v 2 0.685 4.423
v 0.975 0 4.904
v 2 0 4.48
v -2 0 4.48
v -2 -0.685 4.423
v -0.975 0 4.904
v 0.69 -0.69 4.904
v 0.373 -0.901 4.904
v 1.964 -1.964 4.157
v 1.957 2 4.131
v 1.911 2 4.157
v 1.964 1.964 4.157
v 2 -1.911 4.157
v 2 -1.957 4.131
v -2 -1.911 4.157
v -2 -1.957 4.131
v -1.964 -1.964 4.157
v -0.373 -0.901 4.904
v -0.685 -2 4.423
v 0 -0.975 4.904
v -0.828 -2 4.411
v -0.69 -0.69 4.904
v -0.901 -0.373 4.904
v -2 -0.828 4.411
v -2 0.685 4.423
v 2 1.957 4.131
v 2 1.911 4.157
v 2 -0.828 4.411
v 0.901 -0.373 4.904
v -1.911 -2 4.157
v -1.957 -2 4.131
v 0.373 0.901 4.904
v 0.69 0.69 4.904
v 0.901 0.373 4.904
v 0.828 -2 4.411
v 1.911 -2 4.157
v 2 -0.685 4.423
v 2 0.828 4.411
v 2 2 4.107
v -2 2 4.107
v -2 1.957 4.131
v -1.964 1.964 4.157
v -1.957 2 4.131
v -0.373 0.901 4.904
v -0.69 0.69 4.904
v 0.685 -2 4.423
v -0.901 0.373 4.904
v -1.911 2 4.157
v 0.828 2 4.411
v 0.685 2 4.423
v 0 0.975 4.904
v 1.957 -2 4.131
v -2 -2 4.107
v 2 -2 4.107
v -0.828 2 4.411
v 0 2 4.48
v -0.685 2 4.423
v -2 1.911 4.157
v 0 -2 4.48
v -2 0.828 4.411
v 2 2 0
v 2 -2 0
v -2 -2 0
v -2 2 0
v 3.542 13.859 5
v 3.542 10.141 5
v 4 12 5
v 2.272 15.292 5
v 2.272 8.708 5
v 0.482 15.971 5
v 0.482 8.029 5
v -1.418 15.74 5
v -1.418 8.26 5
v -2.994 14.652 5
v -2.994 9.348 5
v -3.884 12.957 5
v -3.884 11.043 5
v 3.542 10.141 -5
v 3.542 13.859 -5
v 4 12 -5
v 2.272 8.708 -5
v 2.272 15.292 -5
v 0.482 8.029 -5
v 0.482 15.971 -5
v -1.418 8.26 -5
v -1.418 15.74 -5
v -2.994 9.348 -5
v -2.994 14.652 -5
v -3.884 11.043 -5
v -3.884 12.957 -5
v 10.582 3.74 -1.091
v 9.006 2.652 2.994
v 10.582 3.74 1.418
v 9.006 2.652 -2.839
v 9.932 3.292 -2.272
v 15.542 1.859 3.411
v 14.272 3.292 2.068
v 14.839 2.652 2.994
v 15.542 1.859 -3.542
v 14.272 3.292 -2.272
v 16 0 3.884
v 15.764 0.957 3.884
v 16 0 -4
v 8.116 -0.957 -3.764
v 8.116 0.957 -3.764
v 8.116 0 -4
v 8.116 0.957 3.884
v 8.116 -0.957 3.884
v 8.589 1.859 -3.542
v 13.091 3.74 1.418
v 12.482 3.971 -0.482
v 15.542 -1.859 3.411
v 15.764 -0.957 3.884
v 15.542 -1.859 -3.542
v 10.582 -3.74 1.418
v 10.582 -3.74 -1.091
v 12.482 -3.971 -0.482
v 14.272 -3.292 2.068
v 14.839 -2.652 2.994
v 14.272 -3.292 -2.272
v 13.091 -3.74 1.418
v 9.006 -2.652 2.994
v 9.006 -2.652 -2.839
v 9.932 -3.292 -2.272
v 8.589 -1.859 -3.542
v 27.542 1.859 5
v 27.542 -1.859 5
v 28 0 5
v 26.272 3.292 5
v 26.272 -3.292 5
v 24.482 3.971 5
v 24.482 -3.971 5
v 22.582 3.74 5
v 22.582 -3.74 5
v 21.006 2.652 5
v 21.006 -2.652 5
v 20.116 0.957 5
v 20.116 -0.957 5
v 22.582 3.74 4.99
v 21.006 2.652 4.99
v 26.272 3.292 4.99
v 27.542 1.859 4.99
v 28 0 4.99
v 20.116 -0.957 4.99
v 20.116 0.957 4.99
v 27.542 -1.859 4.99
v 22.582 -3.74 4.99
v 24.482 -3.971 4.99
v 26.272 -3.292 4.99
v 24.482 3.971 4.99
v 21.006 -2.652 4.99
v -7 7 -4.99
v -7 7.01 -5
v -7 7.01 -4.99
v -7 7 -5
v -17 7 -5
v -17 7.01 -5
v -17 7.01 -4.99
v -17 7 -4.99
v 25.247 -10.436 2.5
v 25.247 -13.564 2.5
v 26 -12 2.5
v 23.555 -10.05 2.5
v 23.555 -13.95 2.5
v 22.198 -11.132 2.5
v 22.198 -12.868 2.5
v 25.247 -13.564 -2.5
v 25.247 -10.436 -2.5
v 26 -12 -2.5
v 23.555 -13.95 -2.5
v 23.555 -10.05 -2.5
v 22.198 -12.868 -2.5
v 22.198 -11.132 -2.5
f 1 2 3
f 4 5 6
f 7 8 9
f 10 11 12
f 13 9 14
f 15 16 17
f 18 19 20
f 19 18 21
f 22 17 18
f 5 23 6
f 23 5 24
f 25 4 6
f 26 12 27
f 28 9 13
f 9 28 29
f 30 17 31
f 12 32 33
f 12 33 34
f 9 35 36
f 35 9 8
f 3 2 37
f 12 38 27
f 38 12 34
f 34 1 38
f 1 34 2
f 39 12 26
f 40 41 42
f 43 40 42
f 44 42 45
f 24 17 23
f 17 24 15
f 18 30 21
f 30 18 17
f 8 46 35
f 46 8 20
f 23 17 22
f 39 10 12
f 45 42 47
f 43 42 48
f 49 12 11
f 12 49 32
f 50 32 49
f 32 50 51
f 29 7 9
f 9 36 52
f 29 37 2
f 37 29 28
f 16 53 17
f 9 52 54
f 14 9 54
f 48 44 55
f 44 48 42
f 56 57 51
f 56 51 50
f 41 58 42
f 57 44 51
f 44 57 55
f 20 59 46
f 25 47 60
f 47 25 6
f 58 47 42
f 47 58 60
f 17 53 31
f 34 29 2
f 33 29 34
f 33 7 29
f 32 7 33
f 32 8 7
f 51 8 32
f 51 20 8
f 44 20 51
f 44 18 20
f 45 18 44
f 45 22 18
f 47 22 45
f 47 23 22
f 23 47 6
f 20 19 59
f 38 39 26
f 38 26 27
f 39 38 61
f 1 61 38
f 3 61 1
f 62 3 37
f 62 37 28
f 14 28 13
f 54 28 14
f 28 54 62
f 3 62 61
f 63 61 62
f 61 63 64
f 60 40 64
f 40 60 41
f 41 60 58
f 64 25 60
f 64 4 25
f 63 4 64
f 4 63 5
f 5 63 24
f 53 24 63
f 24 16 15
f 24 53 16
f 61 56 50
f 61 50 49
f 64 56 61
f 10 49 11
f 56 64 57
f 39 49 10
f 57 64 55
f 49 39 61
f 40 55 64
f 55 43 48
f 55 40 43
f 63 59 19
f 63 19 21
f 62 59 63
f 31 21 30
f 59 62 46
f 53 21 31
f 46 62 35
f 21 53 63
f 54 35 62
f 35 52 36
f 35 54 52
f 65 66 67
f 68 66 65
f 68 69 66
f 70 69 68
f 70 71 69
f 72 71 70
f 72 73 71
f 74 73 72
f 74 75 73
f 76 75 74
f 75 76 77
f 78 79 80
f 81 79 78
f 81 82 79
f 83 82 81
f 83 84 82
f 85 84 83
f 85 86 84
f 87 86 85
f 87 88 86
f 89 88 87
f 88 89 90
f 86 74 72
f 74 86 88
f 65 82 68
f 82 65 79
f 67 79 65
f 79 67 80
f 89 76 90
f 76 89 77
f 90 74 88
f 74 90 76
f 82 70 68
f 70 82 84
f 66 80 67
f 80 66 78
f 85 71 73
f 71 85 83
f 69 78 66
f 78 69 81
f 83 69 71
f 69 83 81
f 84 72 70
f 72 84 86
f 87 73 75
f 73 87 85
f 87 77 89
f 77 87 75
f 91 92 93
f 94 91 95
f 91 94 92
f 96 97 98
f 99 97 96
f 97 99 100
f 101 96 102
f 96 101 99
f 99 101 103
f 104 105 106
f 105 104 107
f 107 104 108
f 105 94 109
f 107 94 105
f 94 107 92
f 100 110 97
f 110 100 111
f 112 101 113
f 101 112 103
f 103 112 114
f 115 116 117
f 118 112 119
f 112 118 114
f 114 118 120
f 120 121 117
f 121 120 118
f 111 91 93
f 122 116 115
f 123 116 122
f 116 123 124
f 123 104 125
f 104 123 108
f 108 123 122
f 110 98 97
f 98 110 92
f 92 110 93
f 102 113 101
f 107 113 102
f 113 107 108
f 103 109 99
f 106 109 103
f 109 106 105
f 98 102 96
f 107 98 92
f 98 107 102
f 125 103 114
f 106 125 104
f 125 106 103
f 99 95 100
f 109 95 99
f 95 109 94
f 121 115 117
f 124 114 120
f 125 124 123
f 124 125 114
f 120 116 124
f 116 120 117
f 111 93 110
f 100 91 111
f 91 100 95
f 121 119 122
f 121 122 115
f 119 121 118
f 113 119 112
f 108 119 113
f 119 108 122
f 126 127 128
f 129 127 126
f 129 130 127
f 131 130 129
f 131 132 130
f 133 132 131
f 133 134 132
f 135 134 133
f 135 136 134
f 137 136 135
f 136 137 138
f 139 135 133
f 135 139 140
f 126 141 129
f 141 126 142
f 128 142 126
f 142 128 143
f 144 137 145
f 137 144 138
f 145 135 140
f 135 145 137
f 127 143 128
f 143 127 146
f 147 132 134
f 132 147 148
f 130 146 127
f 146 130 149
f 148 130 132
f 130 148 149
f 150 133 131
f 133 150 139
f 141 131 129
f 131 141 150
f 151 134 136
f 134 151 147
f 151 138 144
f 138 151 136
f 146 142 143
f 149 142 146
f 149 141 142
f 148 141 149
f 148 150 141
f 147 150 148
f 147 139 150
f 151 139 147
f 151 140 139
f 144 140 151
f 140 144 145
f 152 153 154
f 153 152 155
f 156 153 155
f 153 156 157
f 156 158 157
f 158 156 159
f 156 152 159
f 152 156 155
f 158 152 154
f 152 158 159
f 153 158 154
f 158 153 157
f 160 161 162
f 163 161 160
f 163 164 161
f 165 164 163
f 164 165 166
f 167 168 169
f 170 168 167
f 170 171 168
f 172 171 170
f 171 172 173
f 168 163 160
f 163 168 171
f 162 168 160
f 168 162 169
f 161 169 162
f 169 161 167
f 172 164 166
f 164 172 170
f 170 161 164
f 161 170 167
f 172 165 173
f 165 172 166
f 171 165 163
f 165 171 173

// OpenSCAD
// Volume: 934.5071995884205, SurfaceArea: 876.6402533508077
// Empty
intersection();

// No children
intersection() { }

intersection() {
  sphere(r=5);
  translate([0,0,3]) cube([4,4,6], center=true);
}

translate([0,12,0]) intersection() {
  cube([10,10,10], center=true);
  cylinder(r=4, h=12, center=true);
}

translate([12,0,0]) intersection() {
  cube([10,10,10], center=true);
  cylinder(r=4, h=12, center=true);
  rotate([0,90,0]) cylinder(r=4, h=12, center=true);
}

translate([12,12,0]) intersection() {
  cube([10,10,10], center=true);
  translate([0,0,7.01]) cylinder(r=4, h=4, center=true);
}

translate([24,0,0]) intersection() {
  cube([10,10,10], center=true);
  translate([0,0,6.99]) cylinder(r=4, h=4, center=true);
}

translate([-12,0,0]) intersection() {
  cube([10,10,10], center=true);
  translate([0,-10,-10]) cube([10,10,10], center=true);
}

translate([-12,12,0]) intersection() {
  cube([10,10,10], center=true);
  translate([0,-9.99,-9.99]) cube([10,10,10], center=true);
}

// Intersecting something with nothing
translate([0,-12,0]) intersection() {
  cylinder(r=4, h=5, center=true);
  cube(0);
}

// Intersecting something with nothing (issue 996)
translate([0,-12,0]) intersection() {
  cube(4, center=true);
  linear_extrude();
}
translate([0,-16,0]) intersection() {
  cube(4, center=true);
  render();
}
translate([0,-20,0]) intersection() {
  cube(4, center=true);
  minkowski();
}

// Intersecting 2D with 3D
translate([12,-12,0]) intersection() {
  cube([5,5,5], center=true);
  circle(r=2);
}

// Non-geometry (echo) statement as first child should be ignored
translate([24,-12,0]) intersection() {
  echo("difference-tests");
  cube([5,5,5], center=true);
  cylinder(r=2, h=20, center=true);
}
